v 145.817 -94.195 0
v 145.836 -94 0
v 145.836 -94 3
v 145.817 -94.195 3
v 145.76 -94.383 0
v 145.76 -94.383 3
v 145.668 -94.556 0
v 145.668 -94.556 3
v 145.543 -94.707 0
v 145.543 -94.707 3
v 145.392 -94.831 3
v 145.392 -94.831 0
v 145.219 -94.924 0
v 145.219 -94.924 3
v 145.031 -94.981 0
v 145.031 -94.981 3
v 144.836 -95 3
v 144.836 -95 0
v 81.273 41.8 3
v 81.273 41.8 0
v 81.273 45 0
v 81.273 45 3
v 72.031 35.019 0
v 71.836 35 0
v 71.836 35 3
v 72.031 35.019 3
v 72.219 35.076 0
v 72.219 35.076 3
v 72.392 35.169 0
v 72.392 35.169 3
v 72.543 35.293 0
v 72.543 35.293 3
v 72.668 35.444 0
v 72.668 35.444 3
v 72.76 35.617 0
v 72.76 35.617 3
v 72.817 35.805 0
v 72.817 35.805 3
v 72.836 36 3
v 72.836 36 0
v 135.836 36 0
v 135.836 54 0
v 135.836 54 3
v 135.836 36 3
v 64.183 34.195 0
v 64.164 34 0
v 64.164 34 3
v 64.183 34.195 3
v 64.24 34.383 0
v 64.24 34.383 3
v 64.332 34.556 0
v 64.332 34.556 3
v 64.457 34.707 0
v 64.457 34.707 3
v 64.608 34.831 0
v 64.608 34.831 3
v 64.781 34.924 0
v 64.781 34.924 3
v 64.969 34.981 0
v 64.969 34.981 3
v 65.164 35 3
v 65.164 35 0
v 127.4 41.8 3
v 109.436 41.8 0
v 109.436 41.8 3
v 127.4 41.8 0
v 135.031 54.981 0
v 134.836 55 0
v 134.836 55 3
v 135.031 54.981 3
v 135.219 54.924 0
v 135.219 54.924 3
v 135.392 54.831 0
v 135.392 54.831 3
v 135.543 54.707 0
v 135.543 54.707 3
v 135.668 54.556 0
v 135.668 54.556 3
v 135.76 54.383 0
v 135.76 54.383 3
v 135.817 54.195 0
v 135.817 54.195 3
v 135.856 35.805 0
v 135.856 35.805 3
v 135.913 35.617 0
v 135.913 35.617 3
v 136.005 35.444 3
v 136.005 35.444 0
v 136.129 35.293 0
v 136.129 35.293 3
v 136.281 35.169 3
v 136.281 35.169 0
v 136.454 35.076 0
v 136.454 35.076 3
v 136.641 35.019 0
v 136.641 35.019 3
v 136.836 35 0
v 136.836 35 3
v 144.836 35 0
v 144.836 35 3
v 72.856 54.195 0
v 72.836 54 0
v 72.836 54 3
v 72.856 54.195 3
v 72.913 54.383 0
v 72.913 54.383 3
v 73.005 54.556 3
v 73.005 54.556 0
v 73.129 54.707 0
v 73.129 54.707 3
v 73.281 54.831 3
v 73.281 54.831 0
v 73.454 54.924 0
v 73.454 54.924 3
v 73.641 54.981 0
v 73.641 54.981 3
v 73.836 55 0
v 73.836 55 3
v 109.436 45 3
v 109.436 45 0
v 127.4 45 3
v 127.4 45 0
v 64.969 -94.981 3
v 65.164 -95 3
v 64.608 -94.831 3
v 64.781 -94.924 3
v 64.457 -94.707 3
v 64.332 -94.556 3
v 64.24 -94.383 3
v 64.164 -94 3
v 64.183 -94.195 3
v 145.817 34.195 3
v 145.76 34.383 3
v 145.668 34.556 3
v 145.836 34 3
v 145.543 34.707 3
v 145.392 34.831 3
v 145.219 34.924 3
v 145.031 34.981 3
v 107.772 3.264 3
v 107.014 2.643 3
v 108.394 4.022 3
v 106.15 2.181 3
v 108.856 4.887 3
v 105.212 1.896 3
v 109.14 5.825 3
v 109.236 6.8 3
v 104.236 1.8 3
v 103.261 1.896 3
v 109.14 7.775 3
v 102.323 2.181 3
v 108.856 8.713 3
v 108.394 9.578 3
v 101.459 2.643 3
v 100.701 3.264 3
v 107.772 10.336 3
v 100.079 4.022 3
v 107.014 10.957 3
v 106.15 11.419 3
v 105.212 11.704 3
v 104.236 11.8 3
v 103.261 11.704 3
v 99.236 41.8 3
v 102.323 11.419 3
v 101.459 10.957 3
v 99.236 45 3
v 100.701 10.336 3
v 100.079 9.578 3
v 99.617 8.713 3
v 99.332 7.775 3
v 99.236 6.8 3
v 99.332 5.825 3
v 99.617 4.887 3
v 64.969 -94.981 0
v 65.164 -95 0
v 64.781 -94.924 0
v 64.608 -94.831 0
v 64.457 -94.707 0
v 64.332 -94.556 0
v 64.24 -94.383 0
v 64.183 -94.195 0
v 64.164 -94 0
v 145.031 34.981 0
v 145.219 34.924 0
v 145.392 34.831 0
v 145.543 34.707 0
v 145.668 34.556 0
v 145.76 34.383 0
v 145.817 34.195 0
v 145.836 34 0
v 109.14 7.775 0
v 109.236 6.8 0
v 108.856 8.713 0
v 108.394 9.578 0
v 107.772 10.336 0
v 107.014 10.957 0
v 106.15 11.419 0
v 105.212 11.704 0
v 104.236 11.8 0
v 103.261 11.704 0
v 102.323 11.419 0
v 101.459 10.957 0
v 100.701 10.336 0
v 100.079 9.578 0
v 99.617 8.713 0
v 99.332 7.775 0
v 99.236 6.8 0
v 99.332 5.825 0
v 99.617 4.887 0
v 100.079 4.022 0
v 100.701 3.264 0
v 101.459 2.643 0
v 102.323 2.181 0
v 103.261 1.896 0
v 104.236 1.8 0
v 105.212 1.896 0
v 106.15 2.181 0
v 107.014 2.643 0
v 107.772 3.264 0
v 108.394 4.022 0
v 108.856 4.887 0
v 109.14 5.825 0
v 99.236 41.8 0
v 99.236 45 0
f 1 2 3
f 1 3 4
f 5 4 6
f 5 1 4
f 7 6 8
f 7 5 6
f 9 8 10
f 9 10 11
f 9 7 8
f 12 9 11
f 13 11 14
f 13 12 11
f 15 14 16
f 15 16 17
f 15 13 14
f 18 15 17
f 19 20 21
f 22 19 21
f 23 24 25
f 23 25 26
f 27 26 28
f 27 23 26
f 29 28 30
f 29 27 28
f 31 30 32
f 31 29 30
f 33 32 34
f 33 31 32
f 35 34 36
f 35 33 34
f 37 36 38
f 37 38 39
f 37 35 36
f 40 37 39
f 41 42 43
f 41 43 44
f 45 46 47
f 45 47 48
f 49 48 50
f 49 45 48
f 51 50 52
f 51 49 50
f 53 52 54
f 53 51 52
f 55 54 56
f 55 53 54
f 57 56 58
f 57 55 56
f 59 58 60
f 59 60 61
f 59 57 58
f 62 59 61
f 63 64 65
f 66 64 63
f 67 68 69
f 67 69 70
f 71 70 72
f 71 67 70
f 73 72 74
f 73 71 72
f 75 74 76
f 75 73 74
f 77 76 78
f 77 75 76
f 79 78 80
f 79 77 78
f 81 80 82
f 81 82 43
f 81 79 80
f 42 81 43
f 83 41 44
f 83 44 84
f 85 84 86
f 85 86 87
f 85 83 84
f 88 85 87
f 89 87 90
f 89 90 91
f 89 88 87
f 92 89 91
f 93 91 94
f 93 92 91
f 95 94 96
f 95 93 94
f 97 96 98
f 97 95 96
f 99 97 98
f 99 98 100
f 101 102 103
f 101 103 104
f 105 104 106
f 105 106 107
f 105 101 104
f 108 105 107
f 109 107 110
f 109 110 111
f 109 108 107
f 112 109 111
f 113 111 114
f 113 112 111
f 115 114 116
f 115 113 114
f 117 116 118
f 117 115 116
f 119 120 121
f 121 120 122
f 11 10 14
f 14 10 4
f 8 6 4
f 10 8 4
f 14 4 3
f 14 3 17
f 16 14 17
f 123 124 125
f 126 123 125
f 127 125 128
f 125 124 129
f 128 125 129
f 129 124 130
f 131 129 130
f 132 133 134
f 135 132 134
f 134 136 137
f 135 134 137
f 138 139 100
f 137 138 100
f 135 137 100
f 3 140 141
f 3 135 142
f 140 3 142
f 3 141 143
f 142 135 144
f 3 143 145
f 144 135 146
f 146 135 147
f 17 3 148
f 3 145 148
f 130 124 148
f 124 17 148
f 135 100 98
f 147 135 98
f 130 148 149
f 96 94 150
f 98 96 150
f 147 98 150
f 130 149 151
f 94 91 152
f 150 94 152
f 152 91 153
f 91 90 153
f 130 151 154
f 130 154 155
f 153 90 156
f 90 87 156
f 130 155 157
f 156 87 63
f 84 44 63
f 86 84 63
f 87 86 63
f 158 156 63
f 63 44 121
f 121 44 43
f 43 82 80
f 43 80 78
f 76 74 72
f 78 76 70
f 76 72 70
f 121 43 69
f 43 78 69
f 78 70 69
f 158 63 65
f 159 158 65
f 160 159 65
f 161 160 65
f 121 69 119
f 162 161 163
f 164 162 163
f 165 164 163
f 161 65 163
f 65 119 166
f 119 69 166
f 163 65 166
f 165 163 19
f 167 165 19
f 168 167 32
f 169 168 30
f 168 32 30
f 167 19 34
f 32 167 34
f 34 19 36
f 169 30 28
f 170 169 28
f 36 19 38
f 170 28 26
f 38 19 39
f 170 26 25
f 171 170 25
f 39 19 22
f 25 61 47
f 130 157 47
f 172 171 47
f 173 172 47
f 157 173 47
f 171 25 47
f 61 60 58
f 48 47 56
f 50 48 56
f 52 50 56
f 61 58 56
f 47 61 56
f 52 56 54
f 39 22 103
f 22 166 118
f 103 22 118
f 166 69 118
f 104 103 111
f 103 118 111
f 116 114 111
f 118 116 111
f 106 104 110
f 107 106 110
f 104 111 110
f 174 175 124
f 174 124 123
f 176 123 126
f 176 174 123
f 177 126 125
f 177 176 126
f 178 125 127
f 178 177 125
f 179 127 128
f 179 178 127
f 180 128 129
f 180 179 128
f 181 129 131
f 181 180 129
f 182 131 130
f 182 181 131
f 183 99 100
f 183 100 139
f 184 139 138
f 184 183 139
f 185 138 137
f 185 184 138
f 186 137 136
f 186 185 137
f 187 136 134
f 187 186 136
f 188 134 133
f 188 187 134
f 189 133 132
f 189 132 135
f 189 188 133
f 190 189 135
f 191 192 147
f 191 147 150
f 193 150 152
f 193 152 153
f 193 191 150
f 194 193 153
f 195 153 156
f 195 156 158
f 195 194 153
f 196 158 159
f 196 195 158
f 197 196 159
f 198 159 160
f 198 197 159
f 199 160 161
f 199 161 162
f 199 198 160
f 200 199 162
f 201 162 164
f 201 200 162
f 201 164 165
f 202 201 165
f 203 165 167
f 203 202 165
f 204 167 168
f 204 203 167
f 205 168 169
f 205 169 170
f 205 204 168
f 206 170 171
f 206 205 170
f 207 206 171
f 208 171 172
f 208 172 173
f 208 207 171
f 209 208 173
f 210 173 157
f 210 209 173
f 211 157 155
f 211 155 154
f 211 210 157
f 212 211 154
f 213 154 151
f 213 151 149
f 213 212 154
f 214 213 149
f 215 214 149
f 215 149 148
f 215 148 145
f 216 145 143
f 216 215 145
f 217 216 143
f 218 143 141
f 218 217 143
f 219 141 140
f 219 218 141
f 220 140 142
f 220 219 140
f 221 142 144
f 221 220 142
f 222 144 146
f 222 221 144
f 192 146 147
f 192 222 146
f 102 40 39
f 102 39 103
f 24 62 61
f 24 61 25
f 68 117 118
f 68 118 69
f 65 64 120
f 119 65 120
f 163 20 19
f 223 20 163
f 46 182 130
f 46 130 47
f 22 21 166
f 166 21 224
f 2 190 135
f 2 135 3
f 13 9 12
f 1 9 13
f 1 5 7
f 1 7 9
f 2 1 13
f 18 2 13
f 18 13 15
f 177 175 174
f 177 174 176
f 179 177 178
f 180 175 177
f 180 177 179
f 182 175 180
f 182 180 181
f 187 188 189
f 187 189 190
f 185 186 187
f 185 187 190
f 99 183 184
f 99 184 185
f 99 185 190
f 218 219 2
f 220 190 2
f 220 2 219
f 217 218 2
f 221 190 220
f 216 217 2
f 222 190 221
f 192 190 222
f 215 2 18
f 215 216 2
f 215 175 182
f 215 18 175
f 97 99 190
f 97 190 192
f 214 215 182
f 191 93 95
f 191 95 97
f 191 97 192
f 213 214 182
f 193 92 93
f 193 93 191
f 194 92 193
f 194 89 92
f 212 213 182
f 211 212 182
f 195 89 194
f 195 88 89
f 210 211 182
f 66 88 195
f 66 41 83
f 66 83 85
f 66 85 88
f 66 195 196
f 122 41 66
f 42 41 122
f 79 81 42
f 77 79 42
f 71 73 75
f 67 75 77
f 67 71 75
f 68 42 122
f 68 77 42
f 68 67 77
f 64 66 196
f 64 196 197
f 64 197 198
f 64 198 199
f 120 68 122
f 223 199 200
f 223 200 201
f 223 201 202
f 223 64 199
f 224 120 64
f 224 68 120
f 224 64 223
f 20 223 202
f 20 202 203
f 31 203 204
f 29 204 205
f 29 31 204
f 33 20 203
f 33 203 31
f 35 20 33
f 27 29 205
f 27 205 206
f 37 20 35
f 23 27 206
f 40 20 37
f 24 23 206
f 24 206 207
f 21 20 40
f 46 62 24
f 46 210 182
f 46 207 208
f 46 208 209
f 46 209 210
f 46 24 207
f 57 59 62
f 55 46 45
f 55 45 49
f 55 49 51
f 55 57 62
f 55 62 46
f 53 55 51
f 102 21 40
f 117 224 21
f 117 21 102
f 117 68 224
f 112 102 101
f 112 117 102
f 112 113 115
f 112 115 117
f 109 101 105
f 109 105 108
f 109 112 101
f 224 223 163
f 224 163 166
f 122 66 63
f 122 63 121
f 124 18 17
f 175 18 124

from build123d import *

# Parameters (mm, degrees)
MODEL_R                 = 5
MODEL_W                 = 17.963611368
MODEL_H                 = 3.2
MODEL_W_2               = 17.963611367
SALIENTE_EXTRUIR1_DEPTH = 3


with BuildPart() as part:
    # Model → Saliente-Extruir1 (new body)
    with BuildSketch(Plane.XY):
        with BuildLine():
            Line((64.163611368, -39.615377633), (64.163611368, -4))
            Line((64.163611368, -4), (64.163611368, 15.5))
            Line((64.163611368, 15.5), (64.163611368, 34))
            ThreePointArc((64.163611368, 34), (64.456504586, 34.707106781), (65.163611368, 35))
            Line((65.163611368, 35), (71.836388632, 35))
            ThreePointArc((71.836388632, 35), (72.543495414, 35.292893219), (72.836388632, 36))
            Line((72.836388632, 36), (72.836388632, 54))
            ThreePointArc((72.836388632, 54), (73.129281851, 54.707106781), (73.836388632, 55))
            Line((73.836388632, 55), (134.836388632, 55))
            ThreePointArc((134.836388632, 55), (135.543495414, 54.707106781), (135.836388632, 54))
            Line((135.836388632, 54), (135.836388632, 36))
            ThreePointArc((135.836388632, 36), (136.129281851, 35.292893219), (136.836388632, 35))
            Line((136.836388632, 35), (144.836388632, 35))
            ThreePointArc((144.836388632, 35), (145.543495414, 34.707106781), (145.836388632, 34))
            Line((145.836388632, 34), (145.836388632, -94))
            ThreePointArc((145.836388632, -94), (145.543495414, -94.707106781), (144.836388632, -95))
            Line((144.836388632, -95), (65.163611368, -95))
            ThreePointArc((65.163611368, -95), (64.456504586, -94.707106781), (64.163611368, -94))
            Line((64.163611368, -94), (64.163611368, -39.615377633))
        make_face()
        with Locations((104.236388632, 6.8)):
            Circle(MODEL_R, mode=Mode.SUBTRACT)
        with Locations((118.418194316, 43.4)):
            Rectangle(MODEL_W, MODEL_H, mode=Mode.SUBTRACT)
        with Locations((90.254582949, 43.4)):
            Rectangle(MODEL_W_2, MODEL_H, mode=Mode.SUBTRACT)
    extrude(amount=SALIENTE_EXTRUIR1_DEPTH)


solid = part.part
